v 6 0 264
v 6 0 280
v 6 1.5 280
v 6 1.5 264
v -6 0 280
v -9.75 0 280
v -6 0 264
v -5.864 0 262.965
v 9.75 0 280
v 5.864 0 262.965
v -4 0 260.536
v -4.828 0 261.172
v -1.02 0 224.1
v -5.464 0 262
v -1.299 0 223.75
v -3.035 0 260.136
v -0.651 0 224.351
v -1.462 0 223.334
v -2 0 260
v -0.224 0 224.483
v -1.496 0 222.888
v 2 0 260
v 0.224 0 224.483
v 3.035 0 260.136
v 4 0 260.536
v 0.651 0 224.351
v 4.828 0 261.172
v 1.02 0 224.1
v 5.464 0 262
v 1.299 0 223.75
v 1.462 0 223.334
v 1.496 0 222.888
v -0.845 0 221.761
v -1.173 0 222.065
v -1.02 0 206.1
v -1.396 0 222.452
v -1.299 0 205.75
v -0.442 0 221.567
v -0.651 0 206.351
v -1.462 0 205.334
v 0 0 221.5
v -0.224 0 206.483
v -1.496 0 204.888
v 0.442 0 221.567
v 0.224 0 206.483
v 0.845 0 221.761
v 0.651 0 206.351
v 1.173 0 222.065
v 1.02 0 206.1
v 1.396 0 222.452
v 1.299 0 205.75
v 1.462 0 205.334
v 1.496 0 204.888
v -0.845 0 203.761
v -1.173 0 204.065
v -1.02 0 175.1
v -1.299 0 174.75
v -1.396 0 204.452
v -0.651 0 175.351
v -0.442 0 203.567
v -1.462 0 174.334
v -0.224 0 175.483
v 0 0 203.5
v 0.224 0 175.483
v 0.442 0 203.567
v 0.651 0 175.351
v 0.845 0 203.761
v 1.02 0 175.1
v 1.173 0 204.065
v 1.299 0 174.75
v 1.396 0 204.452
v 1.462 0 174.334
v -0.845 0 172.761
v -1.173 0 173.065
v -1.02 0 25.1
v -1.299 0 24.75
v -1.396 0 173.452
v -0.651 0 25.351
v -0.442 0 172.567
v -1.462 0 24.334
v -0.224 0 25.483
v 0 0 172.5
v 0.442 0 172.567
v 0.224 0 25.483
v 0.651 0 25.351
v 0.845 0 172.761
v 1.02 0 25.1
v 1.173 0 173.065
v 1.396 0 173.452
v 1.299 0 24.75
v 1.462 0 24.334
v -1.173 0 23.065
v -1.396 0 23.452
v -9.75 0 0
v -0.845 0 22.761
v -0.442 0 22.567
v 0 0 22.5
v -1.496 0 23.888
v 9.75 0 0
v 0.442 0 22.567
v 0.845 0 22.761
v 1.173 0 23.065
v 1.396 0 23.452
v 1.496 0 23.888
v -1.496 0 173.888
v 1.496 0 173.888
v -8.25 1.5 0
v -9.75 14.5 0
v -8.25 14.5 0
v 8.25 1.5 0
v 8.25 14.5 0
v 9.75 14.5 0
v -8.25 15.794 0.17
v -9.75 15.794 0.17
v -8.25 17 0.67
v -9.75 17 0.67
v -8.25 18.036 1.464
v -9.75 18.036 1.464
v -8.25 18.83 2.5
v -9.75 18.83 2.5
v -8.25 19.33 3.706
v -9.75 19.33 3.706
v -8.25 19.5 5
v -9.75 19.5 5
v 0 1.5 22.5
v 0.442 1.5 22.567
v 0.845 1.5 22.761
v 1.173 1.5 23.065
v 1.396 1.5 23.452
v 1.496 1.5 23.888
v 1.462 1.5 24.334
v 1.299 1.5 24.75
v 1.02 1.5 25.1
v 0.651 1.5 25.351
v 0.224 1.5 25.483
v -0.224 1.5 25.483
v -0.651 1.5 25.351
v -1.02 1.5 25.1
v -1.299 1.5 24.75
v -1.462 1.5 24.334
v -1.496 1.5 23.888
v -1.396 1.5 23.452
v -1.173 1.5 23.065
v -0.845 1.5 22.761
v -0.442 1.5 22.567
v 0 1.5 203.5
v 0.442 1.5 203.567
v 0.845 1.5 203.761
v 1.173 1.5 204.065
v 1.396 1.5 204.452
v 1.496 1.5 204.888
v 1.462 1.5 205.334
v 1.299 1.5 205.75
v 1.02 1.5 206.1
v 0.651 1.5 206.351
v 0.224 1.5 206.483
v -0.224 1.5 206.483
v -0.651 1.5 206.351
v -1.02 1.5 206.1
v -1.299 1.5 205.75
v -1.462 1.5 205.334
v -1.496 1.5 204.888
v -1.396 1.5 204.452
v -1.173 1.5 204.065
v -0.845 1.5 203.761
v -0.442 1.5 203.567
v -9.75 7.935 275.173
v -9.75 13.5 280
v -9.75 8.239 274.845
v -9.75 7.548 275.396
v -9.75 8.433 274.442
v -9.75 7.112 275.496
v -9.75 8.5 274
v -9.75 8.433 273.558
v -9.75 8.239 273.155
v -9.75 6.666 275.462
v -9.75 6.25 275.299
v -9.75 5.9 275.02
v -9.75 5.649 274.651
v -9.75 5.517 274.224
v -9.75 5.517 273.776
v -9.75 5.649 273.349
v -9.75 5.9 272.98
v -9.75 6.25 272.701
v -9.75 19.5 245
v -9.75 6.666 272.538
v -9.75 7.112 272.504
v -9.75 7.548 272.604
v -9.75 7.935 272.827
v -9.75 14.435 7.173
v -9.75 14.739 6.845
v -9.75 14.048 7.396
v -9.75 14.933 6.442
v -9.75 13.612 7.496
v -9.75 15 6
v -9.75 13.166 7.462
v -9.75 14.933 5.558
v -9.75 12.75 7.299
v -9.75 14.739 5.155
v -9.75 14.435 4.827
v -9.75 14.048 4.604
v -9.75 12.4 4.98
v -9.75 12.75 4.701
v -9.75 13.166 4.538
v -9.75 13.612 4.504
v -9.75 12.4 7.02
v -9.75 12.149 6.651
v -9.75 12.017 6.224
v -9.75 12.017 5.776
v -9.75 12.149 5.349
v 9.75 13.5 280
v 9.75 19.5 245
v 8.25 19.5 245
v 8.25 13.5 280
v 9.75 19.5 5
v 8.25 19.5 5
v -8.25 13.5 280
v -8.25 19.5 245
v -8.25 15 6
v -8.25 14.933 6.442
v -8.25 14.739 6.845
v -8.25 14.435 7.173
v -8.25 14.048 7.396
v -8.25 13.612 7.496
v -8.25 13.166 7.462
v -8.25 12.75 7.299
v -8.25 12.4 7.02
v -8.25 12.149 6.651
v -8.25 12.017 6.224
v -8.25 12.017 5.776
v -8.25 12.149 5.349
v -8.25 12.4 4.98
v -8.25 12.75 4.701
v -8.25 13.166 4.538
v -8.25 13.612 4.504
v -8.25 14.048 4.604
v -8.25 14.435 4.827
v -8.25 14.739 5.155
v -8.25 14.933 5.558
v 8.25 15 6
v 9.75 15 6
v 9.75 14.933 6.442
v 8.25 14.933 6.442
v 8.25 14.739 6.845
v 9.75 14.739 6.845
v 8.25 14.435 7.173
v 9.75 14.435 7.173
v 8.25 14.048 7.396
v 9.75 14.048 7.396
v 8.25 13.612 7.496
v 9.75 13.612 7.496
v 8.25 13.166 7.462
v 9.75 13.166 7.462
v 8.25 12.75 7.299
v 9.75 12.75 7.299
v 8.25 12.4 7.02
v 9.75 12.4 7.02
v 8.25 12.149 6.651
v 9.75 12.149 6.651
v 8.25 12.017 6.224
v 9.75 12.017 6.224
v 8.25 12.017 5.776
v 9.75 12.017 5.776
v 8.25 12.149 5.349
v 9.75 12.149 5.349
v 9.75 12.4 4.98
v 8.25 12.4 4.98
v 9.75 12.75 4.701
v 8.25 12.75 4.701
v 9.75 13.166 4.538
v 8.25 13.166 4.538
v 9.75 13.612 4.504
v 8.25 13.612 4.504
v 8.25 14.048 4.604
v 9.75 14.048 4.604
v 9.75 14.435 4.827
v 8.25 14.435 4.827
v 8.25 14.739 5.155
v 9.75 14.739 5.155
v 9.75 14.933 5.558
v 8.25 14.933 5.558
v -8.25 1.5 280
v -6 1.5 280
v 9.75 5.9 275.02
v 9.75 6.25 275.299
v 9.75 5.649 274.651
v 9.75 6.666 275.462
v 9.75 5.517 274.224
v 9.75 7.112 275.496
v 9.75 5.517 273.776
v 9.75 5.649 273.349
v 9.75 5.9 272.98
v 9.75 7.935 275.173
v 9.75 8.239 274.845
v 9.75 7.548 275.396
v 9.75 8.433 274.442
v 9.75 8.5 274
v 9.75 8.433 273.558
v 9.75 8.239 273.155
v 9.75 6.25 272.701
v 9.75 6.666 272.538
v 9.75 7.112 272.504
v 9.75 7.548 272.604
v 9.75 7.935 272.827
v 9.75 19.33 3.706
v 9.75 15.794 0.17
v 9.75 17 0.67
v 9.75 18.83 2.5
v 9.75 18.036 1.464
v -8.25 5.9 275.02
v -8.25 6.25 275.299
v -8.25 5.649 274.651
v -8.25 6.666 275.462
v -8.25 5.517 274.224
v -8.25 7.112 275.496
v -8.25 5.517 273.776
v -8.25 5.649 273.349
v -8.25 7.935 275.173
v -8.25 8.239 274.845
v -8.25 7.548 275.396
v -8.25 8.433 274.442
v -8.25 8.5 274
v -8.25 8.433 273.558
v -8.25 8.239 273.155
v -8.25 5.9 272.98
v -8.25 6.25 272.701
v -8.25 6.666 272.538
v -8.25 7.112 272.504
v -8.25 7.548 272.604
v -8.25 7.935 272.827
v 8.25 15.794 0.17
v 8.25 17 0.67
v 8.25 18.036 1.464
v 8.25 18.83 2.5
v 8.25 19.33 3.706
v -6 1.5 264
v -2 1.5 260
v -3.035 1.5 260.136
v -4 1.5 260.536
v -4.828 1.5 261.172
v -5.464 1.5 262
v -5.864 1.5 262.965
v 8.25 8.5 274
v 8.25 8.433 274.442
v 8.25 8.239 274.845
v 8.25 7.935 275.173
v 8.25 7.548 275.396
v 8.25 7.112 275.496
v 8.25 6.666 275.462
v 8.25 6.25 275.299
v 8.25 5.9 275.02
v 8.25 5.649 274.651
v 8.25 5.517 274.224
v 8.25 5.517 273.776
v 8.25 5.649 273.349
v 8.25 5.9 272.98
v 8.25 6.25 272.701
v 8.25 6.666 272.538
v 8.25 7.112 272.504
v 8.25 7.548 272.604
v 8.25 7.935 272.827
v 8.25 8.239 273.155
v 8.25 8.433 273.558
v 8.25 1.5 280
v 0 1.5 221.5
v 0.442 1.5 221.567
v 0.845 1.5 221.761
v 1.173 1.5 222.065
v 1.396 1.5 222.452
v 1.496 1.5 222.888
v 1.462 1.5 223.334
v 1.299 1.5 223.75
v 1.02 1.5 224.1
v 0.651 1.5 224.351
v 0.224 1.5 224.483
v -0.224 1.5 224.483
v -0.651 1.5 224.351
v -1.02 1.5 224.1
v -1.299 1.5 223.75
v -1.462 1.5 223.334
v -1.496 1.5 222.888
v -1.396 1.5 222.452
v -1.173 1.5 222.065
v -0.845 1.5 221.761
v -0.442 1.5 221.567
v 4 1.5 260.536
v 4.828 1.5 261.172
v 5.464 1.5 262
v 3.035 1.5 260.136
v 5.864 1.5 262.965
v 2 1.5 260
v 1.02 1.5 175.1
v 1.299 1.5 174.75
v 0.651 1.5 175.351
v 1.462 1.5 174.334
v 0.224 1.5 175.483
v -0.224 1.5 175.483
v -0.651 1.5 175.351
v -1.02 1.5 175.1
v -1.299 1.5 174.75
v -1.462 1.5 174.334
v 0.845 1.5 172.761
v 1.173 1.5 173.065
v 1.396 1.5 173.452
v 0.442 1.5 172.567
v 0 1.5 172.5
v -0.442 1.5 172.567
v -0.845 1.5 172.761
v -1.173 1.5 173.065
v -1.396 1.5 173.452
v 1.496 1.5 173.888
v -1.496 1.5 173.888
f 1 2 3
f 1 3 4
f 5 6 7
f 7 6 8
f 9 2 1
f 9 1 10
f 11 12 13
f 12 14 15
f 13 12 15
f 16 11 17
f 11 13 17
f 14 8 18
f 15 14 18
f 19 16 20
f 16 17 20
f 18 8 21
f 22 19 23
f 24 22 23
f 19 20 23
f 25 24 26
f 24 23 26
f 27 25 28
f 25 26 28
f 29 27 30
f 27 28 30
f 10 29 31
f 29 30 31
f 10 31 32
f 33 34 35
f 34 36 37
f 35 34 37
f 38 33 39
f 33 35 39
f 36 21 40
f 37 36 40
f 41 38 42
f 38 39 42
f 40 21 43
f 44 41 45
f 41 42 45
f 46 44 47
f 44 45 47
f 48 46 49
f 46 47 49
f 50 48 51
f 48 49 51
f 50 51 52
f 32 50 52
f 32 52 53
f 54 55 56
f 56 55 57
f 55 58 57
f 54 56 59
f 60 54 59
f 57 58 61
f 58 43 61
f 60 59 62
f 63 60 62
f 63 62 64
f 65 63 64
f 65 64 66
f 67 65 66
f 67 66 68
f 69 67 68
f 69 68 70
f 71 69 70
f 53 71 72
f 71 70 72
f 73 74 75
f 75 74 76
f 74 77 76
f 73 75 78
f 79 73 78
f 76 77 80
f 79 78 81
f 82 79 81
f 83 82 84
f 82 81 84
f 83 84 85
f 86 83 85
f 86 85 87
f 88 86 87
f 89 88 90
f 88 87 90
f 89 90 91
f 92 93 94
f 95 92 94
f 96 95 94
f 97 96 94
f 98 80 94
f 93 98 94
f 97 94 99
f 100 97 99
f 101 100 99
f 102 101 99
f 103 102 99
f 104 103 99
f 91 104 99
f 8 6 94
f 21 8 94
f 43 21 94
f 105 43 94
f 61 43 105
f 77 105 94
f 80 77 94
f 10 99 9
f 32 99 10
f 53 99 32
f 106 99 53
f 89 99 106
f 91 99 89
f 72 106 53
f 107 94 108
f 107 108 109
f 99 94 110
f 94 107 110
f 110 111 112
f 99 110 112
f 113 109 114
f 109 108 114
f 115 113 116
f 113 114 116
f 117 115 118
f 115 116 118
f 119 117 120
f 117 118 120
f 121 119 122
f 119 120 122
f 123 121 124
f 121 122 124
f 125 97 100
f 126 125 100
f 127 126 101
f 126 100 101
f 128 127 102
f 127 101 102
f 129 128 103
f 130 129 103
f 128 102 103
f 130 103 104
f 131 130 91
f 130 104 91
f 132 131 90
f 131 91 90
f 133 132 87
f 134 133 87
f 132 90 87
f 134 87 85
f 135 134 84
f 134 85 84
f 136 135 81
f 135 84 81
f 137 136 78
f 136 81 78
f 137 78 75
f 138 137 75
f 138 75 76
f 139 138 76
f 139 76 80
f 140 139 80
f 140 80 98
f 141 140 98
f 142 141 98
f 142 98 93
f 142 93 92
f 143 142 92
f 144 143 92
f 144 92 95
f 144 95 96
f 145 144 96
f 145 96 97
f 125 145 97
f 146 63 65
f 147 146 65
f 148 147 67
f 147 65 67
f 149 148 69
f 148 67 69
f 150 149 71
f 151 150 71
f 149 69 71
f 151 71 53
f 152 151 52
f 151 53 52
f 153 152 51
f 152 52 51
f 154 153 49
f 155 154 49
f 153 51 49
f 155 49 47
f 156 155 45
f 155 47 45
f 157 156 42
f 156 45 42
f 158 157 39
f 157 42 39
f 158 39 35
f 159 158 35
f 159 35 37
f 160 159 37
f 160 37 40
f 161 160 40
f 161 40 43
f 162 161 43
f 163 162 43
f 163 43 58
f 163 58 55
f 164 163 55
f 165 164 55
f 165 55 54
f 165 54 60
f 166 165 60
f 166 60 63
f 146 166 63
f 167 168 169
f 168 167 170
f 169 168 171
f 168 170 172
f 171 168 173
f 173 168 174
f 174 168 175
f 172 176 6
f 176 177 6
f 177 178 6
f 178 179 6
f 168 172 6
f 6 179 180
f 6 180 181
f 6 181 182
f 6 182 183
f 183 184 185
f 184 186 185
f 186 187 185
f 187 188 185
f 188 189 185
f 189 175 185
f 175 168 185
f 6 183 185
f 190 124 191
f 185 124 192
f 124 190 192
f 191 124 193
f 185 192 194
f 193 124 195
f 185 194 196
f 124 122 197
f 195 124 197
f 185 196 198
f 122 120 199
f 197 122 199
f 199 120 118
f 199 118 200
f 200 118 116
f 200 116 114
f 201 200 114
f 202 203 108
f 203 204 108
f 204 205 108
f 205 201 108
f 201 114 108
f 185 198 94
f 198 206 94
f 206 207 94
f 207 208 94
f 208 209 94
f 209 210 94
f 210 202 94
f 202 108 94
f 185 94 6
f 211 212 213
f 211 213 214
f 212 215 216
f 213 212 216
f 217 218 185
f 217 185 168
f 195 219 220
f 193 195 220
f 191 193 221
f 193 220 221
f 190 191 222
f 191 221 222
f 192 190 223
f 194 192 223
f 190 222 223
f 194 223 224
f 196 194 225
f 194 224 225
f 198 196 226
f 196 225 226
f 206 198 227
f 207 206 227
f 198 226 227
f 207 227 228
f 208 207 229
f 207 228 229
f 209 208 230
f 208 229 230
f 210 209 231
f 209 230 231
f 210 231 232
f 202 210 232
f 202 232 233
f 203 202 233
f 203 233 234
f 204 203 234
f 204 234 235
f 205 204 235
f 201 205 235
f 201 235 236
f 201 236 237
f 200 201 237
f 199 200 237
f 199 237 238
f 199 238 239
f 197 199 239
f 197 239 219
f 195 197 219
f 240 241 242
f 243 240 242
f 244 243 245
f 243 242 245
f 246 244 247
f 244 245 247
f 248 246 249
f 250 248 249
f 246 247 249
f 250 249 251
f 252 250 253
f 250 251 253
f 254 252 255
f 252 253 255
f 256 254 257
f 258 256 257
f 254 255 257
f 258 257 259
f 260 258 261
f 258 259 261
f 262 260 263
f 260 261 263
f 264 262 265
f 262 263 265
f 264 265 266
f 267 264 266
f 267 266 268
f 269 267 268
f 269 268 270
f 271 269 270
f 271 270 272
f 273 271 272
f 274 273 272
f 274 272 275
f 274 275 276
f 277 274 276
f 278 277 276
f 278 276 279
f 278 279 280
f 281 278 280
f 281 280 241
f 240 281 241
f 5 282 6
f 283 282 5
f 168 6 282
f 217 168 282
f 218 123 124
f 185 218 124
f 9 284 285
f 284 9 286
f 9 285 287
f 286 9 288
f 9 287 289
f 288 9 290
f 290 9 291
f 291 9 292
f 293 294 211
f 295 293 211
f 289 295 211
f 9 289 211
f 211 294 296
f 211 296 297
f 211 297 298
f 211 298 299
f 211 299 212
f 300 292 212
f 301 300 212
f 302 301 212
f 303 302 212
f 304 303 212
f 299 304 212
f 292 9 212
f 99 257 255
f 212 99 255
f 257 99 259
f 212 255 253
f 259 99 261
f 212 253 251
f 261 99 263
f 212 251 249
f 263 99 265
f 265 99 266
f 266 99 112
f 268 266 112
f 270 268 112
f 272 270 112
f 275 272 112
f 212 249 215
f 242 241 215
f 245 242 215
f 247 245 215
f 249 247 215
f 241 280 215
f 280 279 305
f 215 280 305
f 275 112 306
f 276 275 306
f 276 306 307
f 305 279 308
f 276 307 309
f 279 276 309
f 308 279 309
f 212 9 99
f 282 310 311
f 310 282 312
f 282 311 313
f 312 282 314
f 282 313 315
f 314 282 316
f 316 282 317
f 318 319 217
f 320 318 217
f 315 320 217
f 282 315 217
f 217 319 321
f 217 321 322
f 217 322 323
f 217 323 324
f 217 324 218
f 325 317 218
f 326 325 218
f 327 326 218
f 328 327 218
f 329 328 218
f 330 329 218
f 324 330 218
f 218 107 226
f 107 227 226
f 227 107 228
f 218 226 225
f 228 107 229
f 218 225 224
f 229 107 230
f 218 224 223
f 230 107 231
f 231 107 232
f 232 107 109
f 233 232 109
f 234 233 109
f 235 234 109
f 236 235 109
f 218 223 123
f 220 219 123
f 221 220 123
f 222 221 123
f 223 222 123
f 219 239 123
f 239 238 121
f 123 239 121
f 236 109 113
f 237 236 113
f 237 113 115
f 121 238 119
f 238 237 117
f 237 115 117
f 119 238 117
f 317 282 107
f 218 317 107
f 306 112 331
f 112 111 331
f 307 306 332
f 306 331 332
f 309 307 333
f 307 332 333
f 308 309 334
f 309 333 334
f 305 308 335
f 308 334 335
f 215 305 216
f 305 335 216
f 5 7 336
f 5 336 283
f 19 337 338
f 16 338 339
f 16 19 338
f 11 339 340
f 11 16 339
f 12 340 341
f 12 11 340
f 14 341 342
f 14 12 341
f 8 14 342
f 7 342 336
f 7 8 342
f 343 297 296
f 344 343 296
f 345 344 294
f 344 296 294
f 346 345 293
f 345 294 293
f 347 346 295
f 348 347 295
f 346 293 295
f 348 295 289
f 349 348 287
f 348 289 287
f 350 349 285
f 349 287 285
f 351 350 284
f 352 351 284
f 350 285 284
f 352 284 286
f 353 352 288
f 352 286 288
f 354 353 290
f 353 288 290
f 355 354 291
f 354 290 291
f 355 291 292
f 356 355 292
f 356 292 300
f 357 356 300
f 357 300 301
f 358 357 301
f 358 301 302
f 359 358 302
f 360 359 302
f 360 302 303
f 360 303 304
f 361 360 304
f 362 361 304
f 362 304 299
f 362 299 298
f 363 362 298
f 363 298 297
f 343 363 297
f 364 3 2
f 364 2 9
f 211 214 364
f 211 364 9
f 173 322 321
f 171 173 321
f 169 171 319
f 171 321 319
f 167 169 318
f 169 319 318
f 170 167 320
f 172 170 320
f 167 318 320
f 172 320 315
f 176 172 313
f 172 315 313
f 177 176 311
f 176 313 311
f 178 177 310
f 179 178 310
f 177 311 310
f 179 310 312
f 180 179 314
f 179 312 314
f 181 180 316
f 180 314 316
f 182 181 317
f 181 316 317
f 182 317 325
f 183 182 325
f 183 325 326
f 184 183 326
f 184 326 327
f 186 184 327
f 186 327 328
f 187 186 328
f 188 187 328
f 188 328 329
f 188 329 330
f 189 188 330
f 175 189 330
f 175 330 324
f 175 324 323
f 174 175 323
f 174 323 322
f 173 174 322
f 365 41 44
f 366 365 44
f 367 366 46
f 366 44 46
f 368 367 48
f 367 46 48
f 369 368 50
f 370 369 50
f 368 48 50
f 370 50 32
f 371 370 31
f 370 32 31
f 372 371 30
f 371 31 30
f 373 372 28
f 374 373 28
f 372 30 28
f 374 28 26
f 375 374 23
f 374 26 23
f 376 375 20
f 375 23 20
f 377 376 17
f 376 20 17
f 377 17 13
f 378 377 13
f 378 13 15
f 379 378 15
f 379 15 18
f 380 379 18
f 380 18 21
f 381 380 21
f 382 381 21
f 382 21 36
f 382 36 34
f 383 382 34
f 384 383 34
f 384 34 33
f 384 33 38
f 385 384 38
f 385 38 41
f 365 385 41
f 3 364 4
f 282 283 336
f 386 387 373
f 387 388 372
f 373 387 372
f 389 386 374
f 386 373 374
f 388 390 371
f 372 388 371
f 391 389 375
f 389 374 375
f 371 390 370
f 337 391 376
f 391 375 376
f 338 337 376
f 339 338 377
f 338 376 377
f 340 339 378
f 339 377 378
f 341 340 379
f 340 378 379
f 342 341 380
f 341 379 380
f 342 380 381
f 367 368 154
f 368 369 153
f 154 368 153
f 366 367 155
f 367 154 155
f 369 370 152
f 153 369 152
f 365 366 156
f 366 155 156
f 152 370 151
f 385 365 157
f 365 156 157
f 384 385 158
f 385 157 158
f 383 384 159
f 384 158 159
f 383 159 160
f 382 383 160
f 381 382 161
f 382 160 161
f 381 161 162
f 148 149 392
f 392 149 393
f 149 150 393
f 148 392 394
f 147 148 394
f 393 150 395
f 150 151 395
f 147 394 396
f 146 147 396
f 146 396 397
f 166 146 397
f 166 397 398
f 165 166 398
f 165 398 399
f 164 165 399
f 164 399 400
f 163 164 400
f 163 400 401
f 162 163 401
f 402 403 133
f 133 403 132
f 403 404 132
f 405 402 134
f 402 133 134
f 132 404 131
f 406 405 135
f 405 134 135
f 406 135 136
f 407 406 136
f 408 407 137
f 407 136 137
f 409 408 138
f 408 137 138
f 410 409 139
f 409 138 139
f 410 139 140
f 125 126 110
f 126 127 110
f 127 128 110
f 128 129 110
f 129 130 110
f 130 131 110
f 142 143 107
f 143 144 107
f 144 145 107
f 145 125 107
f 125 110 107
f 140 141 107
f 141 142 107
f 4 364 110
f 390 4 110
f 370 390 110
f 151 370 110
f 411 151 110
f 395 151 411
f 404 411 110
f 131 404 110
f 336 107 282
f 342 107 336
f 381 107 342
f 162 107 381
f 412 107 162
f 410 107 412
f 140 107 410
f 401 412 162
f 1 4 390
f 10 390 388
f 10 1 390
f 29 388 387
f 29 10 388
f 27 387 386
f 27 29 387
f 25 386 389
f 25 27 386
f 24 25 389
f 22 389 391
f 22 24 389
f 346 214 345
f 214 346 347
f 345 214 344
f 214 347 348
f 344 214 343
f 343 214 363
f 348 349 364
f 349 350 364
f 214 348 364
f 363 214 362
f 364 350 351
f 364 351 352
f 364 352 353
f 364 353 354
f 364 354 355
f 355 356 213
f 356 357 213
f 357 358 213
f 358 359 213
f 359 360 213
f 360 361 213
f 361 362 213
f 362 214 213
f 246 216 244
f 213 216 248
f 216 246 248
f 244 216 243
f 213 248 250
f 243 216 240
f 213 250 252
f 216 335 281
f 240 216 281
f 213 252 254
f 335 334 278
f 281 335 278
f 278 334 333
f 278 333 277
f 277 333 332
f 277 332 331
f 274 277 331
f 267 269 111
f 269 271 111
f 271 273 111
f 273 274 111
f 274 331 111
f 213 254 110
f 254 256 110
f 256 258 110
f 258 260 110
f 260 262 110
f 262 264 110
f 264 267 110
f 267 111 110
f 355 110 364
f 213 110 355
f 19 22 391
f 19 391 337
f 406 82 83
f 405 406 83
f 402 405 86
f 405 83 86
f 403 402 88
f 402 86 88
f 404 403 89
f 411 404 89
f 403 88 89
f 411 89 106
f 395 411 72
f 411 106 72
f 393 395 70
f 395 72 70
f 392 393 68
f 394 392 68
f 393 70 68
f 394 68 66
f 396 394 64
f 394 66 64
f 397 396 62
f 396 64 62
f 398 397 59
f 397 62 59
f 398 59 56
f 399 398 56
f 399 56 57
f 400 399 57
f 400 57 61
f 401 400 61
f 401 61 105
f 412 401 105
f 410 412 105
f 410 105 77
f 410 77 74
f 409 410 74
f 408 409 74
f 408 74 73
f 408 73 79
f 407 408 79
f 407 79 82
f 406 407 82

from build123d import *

# Parameters (mm, degrees)
EXTRU_MINCE1_DEPTH      = 280
ESQUISSE2_R             = 1.5
ENL_V_MAT_EXTRU_1_DEPTH = 281.847489752
ESQUISSE3_R             = 1.5
ENL_V_MAT_EXTRU_2_DEPTH = 282.354758268
CONG_1_R                = 5


with BuildPart() as part:
    # Esquisse1 → Extru.-Mince1 (new body)
    with BuildSketch(Plane.XY):
        Polygon((-9.75, 19.5), (-9.75, 0), (9.75, 0), (9.75, 19.5), (8.25, 19.5), (8.25, 1.5), (-8.25, 1.5), (-8.25, 19.5), align=None)
    extrude(amount=EXTRU_MINCE1_DEPTH)

    # Esquisse2 → Enlèv. mat.-Extru.1 (cut, through all)
    with BuildSketch(Plane.XZ):
        with Locations(Location((0, 223, 0), (0, 0, 270))):
            Circle(ESQUISSE2_R)
        with Locations(Location((0, 205, 0), (0, 0, 270))):
            Circle(ESQUISSE2_R)
        with Locations(Location((0, 24, 0), (0, 0, 270))):
            Circle(ESQUISSE2_R)
        with Locations(Location((0, 174, 0), (0, 0, 270))):
            Circle(ESQUISSE2_R)
        with BuildLine():
            Line((-6, 280), (6, 280))
            Line((6, 280), (6, 264))
            ThreePointArc((6, 264), (4.828427125, 261.171572875), (2, 260))
            Line((2, 260), (-2, 260))
            ThreePointArc((-2, 260), (-4.828427125, 261.171572875), (-6, 264))
            Line((-6, 264), (-6, 280))
        make_face()
    extrude(amount=-ENL_V_MAT_EXTRU_1_DEPTH, mode=Mode.SUBTRACT)

    # Esquisse3 → Enlèv. mat.-Extru.2 (cut, through all)
    with BuildSketch(Plane(origin=(9.75, 0, 0), x_dir=(0, 0, -1), z_dir=(1, 0, 0))):
        with Locations(Location((-274, 7, 0), (0, 0, 90))):
            Circle(ESQUISSE3_R)
        with Locations(Location((-6, 13.5, 0), (0, 0, 90))):
            Circle(ESQUISSE3_R)
        Polygon((-280, 13.5), (-280, 19.5), (-245, 19.5), align=None)
    extrude(amount=-ENL_V_MAT_EXTRU_2_DEPTH, mode=Mode.SUBTRACT)

    # Congé1
    cong_1_edges = [part.edges().sort_by_distance(p)[0] for p in [
        (-9, 19.5, 0),
        (9, 19.5, 0),
    ]]
    fillet(cong_1_edges, radius=CONG_1_R)


solid = part.part
